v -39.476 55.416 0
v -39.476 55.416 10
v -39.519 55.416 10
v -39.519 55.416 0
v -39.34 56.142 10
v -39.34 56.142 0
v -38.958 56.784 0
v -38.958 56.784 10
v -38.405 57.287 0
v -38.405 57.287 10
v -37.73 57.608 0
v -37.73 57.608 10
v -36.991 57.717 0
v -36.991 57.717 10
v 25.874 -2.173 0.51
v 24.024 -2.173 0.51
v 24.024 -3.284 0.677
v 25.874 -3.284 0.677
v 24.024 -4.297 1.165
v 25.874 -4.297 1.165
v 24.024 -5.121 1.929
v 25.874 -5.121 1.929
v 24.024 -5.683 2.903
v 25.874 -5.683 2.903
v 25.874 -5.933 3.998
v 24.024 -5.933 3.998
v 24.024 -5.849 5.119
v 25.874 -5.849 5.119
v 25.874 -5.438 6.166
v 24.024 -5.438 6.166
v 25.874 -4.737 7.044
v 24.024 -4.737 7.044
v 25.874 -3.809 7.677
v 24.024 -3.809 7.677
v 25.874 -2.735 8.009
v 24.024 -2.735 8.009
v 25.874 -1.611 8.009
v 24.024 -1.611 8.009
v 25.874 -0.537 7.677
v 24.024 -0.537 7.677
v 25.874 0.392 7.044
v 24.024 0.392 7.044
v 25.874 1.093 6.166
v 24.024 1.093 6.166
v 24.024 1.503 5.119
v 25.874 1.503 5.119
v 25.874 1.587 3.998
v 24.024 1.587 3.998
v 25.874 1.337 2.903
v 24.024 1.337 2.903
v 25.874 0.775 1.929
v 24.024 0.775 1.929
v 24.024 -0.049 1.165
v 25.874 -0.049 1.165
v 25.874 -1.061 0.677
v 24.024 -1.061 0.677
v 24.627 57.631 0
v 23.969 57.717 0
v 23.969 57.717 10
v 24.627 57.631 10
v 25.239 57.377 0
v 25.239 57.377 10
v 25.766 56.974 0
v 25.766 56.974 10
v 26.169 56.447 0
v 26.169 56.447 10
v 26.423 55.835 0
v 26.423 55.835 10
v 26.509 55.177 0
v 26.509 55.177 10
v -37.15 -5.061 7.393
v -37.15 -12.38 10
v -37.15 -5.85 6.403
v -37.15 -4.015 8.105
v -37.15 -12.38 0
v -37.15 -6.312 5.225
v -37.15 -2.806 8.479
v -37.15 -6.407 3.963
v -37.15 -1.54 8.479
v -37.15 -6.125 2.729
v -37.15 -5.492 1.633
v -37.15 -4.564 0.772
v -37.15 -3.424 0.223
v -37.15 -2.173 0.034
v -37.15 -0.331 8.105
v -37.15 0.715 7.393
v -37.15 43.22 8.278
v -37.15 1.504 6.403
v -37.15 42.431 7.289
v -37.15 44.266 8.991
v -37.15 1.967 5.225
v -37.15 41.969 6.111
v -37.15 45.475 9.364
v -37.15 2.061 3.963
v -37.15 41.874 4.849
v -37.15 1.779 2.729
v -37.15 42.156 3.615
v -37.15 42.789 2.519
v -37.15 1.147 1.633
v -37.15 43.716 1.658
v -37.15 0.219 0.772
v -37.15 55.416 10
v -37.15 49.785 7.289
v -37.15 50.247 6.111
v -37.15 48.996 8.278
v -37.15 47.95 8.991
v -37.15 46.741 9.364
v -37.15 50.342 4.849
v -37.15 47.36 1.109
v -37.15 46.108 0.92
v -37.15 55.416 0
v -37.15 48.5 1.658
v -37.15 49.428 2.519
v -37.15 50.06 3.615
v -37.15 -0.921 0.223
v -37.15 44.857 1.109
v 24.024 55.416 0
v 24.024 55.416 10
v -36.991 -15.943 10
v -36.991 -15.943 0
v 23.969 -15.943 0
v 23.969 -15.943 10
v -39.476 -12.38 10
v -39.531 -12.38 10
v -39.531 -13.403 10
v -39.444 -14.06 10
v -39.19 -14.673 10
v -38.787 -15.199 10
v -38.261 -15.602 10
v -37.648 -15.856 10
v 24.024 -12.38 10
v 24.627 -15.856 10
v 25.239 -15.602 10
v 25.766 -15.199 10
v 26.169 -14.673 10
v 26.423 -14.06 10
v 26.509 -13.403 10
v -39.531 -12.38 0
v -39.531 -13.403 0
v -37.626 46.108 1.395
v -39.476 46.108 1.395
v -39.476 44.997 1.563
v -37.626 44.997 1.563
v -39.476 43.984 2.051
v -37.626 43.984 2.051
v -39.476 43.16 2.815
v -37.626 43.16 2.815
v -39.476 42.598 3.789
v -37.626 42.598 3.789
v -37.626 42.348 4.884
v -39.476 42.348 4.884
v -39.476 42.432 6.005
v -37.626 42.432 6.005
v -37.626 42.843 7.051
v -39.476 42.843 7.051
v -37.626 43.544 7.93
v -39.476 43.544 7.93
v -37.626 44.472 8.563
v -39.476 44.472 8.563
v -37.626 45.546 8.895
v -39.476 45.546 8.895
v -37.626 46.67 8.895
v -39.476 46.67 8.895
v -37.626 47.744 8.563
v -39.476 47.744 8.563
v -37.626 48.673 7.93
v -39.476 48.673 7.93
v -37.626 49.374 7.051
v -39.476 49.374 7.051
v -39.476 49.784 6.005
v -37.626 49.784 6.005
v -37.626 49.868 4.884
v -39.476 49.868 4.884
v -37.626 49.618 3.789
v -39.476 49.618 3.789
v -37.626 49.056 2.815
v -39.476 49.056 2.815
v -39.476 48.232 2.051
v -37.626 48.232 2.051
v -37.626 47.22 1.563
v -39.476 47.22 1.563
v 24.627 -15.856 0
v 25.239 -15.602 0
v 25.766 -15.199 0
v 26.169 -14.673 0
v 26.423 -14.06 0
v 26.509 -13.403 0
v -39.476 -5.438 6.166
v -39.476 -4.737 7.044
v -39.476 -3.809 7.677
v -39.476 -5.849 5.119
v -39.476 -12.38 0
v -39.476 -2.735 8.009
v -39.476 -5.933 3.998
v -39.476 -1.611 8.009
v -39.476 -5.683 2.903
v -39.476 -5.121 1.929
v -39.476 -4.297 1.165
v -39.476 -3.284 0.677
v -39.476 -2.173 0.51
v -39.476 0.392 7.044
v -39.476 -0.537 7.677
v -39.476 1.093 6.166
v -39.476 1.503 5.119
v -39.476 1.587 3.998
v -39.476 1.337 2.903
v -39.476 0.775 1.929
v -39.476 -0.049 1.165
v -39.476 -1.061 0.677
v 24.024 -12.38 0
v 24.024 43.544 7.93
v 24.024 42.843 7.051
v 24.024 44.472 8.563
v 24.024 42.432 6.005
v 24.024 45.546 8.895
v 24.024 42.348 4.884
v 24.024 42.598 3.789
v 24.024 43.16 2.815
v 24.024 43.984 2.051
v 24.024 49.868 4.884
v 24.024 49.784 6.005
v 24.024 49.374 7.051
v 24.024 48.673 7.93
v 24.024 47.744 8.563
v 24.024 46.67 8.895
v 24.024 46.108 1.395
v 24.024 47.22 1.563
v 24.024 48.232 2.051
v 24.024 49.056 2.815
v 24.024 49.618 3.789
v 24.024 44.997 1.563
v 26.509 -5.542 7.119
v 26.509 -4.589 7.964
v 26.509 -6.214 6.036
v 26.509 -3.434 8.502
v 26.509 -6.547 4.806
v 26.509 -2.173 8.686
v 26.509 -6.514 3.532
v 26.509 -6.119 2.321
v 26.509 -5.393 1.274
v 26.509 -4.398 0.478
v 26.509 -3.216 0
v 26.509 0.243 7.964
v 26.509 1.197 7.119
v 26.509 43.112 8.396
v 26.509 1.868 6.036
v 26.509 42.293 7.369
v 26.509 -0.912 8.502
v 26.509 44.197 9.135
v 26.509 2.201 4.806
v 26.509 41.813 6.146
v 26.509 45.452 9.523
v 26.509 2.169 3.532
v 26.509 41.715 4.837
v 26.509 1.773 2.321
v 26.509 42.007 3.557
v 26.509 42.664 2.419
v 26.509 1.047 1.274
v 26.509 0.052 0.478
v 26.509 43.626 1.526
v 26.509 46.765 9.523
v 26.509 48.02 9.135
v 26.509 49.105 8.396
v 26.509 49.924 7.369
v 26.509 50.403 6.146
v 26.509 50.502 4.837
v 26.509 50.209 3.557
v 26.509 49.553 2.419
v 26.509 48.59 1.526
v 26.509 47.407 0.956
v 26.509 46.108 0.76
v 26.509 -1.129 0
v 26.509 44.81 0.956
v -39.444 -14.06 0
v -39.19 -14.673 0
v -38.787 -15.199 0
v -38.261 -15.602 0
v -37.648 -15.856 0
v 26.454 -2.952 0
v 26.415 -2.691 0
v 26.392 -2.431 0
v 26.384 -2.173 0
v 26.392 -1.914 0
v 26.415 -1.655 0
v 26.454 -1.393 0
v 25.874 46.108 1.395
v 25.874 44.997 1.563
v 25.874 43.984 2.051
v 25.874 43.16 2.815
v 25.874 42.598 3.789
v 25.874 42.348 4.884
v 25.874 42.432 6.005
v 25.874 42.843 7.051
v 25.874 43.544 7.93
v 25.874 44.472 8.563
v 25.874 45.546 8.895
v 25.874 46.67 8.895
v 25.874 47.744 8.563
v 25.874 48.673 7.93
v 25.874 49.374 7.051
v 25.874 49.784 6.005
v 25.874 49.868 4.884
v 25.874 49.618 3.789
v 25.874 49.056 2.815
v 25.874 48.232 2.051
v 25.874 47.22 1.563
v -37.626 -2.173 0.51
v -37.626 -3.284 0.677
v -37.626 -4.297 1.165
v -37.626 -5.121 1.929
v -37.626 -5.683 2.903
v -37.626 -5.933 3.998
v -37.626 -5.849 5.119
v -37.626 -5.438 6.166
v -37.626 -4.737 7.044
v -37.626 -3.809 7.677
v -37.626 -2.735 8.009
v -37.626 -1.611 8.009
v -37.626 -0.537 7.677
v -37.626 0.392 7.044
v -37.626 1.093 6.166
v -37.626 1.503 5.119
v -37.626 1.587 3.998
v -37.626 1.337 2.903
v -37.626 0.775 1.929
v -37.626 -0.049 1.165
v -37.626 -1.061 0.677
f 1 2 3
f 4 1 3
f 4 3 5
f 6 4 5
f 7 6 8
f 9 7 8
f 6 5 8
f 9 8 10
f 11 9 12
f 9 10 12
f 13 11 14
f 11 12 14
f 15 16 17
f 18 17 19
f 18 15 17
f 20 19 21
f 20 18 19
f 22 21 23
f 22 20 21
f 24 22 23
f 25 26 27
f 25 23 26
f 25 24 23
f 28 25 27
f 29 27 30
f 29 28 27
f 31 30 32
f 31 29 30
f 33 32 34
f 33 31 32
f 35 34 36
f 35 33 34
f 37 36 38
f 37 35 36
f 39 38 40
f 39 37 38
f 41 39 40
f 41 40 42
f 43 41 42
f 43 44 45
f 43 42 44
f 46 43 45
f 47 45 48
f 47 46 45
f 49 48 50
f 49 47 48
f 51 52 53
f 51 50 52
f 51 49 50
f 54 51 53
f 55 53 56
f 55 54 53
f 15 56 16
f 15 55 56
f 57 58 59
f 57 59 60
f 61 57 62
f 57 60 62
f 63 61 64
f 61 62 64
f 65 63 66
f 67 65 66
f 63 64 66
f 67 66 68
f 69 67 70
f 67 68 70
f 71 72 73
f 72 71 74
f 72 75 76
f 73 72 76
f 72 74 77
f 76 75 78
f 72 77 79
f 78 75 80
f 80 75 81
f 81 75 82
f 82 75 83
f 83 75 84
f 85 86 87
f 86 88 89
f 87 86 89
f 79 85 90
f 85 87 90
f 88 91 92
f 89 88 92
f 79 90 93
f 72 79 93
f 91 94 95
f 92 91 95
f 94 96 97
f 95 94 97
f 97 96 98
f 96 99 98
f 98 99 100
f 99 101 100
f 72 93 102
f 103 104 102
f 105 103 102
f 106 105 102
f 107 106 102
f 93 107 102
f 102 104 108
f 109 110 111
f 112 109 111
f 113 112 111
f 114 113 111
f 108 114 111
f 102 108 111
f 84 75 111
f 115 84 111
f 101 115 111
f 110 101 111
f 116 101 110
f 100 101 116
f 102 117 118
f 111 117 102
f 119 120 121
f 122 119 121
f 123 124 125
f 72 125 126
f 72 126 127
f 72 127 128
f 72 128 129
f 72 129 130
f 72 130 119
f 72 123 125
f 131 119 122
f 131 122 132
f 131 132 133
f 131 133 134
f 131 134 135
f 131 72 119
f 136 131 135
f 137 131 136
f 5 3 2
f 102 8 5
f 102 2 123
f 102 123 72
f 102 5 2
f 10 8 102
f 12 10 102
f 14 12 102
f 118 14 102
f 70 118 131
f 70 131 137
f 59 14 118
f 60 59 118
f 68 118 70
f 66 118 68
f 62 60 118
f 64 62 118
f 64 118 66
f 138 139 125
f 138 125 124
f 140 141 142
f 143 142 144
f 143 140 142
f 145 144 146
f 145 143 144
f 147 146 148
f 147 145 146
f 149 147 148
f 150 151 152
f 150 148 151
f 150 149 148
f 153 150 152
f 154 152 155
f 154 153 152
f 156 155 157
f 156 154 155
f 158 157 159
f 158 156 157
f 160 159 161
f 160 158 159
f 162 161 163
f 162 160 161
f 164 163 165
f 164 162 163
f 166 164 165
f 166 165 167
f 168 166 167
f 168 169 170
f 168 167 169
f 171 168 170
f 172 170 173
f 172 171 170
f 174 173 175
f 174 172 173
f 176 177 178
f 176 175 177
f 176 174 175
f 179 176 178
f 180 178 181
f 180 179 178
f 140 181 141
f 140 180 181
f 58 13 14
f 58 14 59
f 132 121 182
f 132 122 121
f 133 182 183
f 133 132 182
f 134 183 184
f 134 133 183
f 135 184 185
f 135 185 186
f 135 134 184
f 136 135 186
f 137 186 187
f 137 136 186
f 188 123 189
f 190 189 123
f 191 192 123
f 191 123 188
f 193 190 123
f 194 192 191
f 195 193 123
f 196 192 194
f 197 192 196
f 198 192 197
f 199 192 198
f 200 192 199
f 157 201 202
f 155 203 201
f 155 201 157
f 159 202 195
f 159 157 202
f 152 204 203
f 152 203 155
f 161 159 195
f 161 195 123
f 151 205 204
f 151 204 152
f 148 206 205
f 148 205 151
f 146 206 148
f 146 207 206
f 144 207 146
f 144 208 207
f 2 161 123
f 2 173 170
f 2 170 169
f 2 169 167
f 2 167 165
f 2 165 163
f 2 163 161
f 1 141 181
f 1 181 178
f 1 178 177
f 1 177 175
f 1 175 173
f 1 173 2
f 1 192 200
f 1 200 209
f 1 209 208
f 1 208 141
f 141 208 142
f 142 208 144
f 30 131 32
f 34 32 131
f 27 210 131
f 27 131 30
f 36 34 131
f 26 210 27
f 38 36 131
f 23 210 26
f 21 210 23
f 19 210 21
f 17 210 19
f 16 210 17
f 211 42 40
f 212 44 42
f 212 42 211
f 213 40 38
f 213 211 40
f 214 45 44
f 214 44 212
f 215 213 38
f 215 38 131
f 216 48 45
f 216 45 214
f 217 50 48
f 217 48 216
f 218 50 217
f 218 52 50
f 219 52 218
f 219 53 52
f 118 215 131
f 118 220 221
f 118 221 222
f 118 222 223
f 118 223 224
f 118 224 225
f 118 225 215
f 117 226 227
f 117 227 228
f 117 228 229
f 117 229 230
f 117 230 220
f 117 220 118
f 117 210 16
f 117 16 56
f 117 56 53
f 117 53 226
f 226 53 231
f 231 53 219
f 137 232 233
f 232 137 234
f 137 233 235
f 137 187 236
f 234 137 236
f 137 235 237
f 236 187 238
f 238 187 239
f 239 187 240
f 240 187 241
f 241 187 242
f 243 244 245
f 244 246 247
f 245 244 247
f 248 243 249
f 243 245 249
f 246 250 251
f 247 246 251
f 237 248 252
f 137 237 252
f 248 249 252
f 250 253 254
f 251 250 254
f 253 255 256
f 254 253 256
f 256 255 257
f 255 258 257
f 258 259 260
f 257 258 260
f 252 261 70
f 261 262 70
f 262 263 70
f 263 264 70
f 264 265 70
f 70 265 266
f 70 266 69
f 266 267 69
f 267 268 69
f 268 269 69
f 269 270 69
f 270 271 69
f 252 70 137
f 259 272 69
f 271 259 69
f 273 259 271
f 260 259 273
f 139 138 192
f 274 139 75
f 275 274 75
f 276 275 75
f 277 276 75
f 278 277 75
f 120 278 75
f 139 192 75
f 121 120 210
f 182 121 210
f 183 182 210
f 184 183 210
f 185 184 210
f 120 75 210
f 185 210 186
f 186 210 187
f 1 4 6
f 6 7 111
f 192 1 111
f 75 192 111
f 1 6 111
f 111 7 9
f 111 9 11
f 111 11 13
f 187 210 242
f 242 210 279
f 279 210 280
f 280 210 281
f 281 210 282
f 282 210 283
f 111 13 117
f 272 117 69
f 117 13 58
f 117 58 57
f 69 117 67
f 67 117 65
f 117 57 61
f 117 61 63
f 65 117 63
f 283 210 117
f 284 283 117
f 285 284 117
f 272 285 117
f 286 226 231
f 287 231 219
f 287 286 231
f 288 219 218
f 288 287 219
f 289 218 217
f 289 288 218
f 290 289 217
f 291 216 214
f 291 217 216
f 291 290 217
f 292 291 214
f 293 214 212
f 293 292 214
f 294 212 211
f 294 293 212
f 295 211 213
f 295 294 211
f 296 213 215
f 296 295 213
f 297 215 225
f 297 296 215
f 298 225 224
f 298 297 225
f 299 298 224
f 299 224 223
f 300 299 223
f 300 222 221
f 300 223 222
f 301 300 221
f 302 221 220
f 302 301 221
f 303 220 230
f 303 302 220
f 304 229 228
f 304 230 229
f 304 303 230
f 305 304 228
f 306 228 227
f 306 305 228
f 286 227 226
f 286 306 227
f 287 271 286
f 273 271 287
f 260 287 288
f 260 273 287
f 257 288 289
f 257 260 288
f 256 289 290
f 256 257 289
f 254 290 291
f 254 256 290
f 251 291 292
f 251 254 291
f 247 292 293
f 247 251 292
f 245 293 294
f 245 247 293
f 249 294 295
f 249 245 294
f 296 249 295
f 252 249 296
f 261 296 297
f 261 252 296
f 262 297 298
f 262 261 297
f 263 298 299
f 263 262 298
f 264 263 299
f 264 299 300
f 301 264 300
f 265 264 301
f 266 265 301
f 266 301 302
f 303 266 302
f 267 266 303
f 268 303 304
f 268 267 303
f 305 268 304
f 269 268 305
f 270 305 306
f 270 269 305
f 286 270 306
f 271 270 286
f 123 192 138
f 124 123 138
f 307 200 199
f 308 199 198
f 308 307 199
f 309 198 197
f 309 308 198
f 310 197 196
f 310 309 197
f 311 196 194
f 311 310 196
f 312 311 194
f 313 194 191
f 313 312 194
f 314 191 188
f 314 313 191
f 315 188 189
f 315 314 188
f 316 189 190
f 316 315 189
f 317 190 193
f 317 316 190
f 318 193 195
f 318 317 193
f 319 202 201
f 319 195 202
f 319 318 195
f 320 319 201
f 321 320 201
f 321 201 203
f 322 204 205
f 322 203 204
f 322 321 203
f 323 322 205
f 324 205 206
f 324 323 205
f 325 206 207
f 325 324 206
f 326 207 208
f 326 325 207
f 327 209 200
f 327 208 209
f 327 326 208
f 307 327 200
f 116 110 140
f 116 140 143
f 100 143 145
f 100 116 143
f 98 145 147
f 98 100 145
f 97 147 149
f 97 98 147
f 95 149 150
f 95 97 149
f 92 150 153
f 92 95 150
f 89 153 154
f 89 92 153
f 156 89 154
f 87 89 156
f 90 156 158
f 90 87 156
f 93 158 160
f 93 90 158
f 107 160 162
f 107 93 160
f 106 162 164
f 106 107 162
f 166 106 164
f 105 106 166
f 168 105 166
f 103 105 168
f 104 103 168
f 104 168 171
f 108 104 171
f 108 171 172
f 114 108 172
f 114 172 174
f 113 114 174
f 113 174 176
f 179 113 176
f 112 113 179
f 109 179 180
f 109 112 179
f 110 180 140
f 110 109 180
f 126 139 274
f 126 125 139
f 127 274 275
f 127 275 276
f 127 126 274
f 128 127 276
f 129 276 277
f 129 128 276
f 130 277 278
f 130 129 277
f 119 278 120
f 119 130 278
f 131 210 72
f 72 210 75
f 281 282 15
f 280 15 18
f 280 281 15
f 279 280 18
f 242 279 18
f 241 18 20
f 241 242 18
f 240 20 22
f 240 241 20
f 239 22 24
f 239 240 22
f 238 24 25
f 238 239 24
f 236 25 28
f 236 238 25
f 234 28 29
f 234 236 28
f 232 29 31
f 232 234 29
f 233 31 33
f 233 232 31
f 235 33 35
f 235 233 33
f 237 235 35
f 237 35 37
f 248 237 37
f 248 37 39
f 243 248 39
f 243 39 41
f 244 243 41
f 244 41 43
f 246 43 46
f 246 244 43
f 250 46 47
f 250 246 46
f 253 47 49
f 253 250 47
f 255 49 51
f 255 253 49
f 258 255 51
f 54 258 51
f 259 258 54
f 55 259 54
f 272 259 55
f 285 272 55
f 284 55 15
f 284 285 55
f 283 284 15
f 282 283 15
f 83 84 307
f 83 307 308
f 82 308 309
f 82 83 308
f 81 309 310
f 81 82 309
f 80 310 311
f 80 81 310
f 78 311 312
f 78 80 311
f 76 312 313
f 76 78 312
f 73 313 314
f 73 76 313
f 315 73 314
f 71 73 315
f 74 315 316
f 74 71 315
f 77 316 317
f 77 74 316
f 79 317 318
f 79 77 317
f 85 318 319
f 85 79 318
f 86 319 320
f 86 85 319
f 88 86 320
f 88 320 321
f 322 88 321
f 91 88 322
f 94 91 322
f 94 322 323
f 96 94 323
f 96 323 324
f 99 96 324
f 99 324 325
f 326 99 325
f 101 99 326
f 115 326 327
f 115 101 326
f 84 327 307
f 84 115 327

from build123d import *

# Parameters (mm, degrees)
SKETCH1_W                                  = 66.04
SKETCH1_H                                  = 73.66
BOSS_EXTRUDE1_DEPTH                        = 66.04
CONVERT_SOLID1_START                       = 10
CONVERT_SOLID1_OUTLINE_W                   = 66.04
CONVERT_SOLID1_OUTLINE_H                   = 73.66
CONVERT_SOLID1_DEPTH                       = 56.04
SKETCH12_W                                 = 61.174671733
SKETCH12_H                                 = 67.796672281
CUT_EXTRUDE1_DEPTH                         = 71.66800329
FILLET1_R                                  = 2.54
CBORE_FOR_8_FILLISTER_HEAD_MACHINE_2_COUNT = 2
CBORE_FOR_8_FILLISTER_HEAD_MACHINE_2_PITCH = 48.289098212
LPATTERN1_COUNT                            = 2
LPATTERN1_PITCH                            = 63.5


# Read off the part's stored shape, not the designer's step: Convert-Solid1
with BuildPart() as part:
    # Sketch1 → Boss-Extrude1 (new body)
    with BuildSketch(Plane.XY):
        with Locations((-6.510518448, 20.887456633)):
            Rectangle(SKETCH1_W, SKETCH1_H)
    extrude(amount=BOSS_EXTRUDE1_DEPTH)

    # Convert-Solid1 outline → Convert-Solid1 (cut)
    with BuildSketch(Plane.XY.offset(CONVERT_SOLID1_START)):
        with Locations((-6.510518448, 20.887456633)):
            Rectangle(CONVERT_SOLID1_OUTLINE_W, CONVERT_SOLID1_OUTLINE_H)
    extrude(amount=CONVERT_SOLID1_DEPTH, mode=Mode.SUBTRACT)

    # Sketch12 → Cut-Extrude1 (cut, symmetric)
    with BuildSketch(Plane(origin=(0, 0, 0), x_dir=(-1, 0, 0), z_dir=(0, 0, -1))):
        with Locations((6.563074008, 21.518123352)):
            Rectangle(SKETCH12_W, SKETCH12_H)
    cut_extrude1 = extrude(amount=CUT_EXTRUDE1_DEPTH, both=True, mode=Mode.SUBTRACT)

    # Fillet1
    fillet1_edges = [part.edges().sort_by_distance(p)[0] for p in [
        (-39.530518448, 57.717456633, 5),
        (-39.530518448, -15.942543367, 5),
        (26.509481552, -15.942543367, 5),
        (26.509481552, 57.717456633, 5),
    ]]
    fillet(fillet1_edges, radius=FILLET1_R)

    # Sketch18 → CBORE for #8 Fillister Head Machine Screw1 (revolve, cut)
    with BuildSketch(Plane(origin=(26.509481552, 46.108209089, 5.16610426), x_dir=(0, 0, -1), z_dir=(0, 1, 0))):
        Polygon((0, 0), (0, 26.750674586), (2.2479, 25.4), (2.2479, 3.9624), (3.77063, 3.9624), (3.77063, 0.635), (4.40563, 0), align=None)
    cbore_for_8_fillister_head_machine_scre = revolve(axis=Axis((32.859481552, 46.108209089, 5.16610426), (-1, 0, 0)), mode=Mode.SUBTRACT)

    # CBORE for _8 Fillister Head Machine  2: CBORE for #8 Fillister Head Machine Screw1 ×2
    with Locations(*[Vector(0, -0.9998317064949376, -0.018345535898989723) * (i * CBORE_FOR_8_FILLISTER_HEAD_MACHINE_2_PITCH) for i in range(1, CBORE_FOR_8_FILLISTER_HEAD_MACHINE_2_COUNT)]):
        add(cbore_for_8_fillister_head_machine_scre, mode=Mode.SUBTRACT)

    # LPattern1: Cut-Extrude1, CBORE for #8 Fillister Head Machine Screw1 ×2
    with Locations(*[(-i * LPATTERN1_PITCH, 0, 0) for i in range(1, LPATTERN1_COUNT)]):
        add(cut_extrude1, mode=Mode.SUBTRACT)
        add(cbore_for_8_fillister_head_machine_scre, mode=Mode.SUBTRACT)

    # LPattern1 copy 1 sketch → LPattern1 copy 1 (revolve, cut)
    with BuildSketch(Plane(origin=(-36.990518448, -2.172762381, 4.280214875), x_dir=(0, 0, -1), z_dir=(0, 1, 0))):
        Polygon((0, 0), (0, 26.750674586), (2.2479, 25.4), (2.2479, 3.9624), (3.77063, 3.9624), (3.77063, 0.635), (4.40563, 0), align=None)
    revolve(axis=Axis((-30.640518448, -2.172762381, 4.280214875), (-1, 0, 0)), mode=Mode.SUBTRACT)


solid = part.part
